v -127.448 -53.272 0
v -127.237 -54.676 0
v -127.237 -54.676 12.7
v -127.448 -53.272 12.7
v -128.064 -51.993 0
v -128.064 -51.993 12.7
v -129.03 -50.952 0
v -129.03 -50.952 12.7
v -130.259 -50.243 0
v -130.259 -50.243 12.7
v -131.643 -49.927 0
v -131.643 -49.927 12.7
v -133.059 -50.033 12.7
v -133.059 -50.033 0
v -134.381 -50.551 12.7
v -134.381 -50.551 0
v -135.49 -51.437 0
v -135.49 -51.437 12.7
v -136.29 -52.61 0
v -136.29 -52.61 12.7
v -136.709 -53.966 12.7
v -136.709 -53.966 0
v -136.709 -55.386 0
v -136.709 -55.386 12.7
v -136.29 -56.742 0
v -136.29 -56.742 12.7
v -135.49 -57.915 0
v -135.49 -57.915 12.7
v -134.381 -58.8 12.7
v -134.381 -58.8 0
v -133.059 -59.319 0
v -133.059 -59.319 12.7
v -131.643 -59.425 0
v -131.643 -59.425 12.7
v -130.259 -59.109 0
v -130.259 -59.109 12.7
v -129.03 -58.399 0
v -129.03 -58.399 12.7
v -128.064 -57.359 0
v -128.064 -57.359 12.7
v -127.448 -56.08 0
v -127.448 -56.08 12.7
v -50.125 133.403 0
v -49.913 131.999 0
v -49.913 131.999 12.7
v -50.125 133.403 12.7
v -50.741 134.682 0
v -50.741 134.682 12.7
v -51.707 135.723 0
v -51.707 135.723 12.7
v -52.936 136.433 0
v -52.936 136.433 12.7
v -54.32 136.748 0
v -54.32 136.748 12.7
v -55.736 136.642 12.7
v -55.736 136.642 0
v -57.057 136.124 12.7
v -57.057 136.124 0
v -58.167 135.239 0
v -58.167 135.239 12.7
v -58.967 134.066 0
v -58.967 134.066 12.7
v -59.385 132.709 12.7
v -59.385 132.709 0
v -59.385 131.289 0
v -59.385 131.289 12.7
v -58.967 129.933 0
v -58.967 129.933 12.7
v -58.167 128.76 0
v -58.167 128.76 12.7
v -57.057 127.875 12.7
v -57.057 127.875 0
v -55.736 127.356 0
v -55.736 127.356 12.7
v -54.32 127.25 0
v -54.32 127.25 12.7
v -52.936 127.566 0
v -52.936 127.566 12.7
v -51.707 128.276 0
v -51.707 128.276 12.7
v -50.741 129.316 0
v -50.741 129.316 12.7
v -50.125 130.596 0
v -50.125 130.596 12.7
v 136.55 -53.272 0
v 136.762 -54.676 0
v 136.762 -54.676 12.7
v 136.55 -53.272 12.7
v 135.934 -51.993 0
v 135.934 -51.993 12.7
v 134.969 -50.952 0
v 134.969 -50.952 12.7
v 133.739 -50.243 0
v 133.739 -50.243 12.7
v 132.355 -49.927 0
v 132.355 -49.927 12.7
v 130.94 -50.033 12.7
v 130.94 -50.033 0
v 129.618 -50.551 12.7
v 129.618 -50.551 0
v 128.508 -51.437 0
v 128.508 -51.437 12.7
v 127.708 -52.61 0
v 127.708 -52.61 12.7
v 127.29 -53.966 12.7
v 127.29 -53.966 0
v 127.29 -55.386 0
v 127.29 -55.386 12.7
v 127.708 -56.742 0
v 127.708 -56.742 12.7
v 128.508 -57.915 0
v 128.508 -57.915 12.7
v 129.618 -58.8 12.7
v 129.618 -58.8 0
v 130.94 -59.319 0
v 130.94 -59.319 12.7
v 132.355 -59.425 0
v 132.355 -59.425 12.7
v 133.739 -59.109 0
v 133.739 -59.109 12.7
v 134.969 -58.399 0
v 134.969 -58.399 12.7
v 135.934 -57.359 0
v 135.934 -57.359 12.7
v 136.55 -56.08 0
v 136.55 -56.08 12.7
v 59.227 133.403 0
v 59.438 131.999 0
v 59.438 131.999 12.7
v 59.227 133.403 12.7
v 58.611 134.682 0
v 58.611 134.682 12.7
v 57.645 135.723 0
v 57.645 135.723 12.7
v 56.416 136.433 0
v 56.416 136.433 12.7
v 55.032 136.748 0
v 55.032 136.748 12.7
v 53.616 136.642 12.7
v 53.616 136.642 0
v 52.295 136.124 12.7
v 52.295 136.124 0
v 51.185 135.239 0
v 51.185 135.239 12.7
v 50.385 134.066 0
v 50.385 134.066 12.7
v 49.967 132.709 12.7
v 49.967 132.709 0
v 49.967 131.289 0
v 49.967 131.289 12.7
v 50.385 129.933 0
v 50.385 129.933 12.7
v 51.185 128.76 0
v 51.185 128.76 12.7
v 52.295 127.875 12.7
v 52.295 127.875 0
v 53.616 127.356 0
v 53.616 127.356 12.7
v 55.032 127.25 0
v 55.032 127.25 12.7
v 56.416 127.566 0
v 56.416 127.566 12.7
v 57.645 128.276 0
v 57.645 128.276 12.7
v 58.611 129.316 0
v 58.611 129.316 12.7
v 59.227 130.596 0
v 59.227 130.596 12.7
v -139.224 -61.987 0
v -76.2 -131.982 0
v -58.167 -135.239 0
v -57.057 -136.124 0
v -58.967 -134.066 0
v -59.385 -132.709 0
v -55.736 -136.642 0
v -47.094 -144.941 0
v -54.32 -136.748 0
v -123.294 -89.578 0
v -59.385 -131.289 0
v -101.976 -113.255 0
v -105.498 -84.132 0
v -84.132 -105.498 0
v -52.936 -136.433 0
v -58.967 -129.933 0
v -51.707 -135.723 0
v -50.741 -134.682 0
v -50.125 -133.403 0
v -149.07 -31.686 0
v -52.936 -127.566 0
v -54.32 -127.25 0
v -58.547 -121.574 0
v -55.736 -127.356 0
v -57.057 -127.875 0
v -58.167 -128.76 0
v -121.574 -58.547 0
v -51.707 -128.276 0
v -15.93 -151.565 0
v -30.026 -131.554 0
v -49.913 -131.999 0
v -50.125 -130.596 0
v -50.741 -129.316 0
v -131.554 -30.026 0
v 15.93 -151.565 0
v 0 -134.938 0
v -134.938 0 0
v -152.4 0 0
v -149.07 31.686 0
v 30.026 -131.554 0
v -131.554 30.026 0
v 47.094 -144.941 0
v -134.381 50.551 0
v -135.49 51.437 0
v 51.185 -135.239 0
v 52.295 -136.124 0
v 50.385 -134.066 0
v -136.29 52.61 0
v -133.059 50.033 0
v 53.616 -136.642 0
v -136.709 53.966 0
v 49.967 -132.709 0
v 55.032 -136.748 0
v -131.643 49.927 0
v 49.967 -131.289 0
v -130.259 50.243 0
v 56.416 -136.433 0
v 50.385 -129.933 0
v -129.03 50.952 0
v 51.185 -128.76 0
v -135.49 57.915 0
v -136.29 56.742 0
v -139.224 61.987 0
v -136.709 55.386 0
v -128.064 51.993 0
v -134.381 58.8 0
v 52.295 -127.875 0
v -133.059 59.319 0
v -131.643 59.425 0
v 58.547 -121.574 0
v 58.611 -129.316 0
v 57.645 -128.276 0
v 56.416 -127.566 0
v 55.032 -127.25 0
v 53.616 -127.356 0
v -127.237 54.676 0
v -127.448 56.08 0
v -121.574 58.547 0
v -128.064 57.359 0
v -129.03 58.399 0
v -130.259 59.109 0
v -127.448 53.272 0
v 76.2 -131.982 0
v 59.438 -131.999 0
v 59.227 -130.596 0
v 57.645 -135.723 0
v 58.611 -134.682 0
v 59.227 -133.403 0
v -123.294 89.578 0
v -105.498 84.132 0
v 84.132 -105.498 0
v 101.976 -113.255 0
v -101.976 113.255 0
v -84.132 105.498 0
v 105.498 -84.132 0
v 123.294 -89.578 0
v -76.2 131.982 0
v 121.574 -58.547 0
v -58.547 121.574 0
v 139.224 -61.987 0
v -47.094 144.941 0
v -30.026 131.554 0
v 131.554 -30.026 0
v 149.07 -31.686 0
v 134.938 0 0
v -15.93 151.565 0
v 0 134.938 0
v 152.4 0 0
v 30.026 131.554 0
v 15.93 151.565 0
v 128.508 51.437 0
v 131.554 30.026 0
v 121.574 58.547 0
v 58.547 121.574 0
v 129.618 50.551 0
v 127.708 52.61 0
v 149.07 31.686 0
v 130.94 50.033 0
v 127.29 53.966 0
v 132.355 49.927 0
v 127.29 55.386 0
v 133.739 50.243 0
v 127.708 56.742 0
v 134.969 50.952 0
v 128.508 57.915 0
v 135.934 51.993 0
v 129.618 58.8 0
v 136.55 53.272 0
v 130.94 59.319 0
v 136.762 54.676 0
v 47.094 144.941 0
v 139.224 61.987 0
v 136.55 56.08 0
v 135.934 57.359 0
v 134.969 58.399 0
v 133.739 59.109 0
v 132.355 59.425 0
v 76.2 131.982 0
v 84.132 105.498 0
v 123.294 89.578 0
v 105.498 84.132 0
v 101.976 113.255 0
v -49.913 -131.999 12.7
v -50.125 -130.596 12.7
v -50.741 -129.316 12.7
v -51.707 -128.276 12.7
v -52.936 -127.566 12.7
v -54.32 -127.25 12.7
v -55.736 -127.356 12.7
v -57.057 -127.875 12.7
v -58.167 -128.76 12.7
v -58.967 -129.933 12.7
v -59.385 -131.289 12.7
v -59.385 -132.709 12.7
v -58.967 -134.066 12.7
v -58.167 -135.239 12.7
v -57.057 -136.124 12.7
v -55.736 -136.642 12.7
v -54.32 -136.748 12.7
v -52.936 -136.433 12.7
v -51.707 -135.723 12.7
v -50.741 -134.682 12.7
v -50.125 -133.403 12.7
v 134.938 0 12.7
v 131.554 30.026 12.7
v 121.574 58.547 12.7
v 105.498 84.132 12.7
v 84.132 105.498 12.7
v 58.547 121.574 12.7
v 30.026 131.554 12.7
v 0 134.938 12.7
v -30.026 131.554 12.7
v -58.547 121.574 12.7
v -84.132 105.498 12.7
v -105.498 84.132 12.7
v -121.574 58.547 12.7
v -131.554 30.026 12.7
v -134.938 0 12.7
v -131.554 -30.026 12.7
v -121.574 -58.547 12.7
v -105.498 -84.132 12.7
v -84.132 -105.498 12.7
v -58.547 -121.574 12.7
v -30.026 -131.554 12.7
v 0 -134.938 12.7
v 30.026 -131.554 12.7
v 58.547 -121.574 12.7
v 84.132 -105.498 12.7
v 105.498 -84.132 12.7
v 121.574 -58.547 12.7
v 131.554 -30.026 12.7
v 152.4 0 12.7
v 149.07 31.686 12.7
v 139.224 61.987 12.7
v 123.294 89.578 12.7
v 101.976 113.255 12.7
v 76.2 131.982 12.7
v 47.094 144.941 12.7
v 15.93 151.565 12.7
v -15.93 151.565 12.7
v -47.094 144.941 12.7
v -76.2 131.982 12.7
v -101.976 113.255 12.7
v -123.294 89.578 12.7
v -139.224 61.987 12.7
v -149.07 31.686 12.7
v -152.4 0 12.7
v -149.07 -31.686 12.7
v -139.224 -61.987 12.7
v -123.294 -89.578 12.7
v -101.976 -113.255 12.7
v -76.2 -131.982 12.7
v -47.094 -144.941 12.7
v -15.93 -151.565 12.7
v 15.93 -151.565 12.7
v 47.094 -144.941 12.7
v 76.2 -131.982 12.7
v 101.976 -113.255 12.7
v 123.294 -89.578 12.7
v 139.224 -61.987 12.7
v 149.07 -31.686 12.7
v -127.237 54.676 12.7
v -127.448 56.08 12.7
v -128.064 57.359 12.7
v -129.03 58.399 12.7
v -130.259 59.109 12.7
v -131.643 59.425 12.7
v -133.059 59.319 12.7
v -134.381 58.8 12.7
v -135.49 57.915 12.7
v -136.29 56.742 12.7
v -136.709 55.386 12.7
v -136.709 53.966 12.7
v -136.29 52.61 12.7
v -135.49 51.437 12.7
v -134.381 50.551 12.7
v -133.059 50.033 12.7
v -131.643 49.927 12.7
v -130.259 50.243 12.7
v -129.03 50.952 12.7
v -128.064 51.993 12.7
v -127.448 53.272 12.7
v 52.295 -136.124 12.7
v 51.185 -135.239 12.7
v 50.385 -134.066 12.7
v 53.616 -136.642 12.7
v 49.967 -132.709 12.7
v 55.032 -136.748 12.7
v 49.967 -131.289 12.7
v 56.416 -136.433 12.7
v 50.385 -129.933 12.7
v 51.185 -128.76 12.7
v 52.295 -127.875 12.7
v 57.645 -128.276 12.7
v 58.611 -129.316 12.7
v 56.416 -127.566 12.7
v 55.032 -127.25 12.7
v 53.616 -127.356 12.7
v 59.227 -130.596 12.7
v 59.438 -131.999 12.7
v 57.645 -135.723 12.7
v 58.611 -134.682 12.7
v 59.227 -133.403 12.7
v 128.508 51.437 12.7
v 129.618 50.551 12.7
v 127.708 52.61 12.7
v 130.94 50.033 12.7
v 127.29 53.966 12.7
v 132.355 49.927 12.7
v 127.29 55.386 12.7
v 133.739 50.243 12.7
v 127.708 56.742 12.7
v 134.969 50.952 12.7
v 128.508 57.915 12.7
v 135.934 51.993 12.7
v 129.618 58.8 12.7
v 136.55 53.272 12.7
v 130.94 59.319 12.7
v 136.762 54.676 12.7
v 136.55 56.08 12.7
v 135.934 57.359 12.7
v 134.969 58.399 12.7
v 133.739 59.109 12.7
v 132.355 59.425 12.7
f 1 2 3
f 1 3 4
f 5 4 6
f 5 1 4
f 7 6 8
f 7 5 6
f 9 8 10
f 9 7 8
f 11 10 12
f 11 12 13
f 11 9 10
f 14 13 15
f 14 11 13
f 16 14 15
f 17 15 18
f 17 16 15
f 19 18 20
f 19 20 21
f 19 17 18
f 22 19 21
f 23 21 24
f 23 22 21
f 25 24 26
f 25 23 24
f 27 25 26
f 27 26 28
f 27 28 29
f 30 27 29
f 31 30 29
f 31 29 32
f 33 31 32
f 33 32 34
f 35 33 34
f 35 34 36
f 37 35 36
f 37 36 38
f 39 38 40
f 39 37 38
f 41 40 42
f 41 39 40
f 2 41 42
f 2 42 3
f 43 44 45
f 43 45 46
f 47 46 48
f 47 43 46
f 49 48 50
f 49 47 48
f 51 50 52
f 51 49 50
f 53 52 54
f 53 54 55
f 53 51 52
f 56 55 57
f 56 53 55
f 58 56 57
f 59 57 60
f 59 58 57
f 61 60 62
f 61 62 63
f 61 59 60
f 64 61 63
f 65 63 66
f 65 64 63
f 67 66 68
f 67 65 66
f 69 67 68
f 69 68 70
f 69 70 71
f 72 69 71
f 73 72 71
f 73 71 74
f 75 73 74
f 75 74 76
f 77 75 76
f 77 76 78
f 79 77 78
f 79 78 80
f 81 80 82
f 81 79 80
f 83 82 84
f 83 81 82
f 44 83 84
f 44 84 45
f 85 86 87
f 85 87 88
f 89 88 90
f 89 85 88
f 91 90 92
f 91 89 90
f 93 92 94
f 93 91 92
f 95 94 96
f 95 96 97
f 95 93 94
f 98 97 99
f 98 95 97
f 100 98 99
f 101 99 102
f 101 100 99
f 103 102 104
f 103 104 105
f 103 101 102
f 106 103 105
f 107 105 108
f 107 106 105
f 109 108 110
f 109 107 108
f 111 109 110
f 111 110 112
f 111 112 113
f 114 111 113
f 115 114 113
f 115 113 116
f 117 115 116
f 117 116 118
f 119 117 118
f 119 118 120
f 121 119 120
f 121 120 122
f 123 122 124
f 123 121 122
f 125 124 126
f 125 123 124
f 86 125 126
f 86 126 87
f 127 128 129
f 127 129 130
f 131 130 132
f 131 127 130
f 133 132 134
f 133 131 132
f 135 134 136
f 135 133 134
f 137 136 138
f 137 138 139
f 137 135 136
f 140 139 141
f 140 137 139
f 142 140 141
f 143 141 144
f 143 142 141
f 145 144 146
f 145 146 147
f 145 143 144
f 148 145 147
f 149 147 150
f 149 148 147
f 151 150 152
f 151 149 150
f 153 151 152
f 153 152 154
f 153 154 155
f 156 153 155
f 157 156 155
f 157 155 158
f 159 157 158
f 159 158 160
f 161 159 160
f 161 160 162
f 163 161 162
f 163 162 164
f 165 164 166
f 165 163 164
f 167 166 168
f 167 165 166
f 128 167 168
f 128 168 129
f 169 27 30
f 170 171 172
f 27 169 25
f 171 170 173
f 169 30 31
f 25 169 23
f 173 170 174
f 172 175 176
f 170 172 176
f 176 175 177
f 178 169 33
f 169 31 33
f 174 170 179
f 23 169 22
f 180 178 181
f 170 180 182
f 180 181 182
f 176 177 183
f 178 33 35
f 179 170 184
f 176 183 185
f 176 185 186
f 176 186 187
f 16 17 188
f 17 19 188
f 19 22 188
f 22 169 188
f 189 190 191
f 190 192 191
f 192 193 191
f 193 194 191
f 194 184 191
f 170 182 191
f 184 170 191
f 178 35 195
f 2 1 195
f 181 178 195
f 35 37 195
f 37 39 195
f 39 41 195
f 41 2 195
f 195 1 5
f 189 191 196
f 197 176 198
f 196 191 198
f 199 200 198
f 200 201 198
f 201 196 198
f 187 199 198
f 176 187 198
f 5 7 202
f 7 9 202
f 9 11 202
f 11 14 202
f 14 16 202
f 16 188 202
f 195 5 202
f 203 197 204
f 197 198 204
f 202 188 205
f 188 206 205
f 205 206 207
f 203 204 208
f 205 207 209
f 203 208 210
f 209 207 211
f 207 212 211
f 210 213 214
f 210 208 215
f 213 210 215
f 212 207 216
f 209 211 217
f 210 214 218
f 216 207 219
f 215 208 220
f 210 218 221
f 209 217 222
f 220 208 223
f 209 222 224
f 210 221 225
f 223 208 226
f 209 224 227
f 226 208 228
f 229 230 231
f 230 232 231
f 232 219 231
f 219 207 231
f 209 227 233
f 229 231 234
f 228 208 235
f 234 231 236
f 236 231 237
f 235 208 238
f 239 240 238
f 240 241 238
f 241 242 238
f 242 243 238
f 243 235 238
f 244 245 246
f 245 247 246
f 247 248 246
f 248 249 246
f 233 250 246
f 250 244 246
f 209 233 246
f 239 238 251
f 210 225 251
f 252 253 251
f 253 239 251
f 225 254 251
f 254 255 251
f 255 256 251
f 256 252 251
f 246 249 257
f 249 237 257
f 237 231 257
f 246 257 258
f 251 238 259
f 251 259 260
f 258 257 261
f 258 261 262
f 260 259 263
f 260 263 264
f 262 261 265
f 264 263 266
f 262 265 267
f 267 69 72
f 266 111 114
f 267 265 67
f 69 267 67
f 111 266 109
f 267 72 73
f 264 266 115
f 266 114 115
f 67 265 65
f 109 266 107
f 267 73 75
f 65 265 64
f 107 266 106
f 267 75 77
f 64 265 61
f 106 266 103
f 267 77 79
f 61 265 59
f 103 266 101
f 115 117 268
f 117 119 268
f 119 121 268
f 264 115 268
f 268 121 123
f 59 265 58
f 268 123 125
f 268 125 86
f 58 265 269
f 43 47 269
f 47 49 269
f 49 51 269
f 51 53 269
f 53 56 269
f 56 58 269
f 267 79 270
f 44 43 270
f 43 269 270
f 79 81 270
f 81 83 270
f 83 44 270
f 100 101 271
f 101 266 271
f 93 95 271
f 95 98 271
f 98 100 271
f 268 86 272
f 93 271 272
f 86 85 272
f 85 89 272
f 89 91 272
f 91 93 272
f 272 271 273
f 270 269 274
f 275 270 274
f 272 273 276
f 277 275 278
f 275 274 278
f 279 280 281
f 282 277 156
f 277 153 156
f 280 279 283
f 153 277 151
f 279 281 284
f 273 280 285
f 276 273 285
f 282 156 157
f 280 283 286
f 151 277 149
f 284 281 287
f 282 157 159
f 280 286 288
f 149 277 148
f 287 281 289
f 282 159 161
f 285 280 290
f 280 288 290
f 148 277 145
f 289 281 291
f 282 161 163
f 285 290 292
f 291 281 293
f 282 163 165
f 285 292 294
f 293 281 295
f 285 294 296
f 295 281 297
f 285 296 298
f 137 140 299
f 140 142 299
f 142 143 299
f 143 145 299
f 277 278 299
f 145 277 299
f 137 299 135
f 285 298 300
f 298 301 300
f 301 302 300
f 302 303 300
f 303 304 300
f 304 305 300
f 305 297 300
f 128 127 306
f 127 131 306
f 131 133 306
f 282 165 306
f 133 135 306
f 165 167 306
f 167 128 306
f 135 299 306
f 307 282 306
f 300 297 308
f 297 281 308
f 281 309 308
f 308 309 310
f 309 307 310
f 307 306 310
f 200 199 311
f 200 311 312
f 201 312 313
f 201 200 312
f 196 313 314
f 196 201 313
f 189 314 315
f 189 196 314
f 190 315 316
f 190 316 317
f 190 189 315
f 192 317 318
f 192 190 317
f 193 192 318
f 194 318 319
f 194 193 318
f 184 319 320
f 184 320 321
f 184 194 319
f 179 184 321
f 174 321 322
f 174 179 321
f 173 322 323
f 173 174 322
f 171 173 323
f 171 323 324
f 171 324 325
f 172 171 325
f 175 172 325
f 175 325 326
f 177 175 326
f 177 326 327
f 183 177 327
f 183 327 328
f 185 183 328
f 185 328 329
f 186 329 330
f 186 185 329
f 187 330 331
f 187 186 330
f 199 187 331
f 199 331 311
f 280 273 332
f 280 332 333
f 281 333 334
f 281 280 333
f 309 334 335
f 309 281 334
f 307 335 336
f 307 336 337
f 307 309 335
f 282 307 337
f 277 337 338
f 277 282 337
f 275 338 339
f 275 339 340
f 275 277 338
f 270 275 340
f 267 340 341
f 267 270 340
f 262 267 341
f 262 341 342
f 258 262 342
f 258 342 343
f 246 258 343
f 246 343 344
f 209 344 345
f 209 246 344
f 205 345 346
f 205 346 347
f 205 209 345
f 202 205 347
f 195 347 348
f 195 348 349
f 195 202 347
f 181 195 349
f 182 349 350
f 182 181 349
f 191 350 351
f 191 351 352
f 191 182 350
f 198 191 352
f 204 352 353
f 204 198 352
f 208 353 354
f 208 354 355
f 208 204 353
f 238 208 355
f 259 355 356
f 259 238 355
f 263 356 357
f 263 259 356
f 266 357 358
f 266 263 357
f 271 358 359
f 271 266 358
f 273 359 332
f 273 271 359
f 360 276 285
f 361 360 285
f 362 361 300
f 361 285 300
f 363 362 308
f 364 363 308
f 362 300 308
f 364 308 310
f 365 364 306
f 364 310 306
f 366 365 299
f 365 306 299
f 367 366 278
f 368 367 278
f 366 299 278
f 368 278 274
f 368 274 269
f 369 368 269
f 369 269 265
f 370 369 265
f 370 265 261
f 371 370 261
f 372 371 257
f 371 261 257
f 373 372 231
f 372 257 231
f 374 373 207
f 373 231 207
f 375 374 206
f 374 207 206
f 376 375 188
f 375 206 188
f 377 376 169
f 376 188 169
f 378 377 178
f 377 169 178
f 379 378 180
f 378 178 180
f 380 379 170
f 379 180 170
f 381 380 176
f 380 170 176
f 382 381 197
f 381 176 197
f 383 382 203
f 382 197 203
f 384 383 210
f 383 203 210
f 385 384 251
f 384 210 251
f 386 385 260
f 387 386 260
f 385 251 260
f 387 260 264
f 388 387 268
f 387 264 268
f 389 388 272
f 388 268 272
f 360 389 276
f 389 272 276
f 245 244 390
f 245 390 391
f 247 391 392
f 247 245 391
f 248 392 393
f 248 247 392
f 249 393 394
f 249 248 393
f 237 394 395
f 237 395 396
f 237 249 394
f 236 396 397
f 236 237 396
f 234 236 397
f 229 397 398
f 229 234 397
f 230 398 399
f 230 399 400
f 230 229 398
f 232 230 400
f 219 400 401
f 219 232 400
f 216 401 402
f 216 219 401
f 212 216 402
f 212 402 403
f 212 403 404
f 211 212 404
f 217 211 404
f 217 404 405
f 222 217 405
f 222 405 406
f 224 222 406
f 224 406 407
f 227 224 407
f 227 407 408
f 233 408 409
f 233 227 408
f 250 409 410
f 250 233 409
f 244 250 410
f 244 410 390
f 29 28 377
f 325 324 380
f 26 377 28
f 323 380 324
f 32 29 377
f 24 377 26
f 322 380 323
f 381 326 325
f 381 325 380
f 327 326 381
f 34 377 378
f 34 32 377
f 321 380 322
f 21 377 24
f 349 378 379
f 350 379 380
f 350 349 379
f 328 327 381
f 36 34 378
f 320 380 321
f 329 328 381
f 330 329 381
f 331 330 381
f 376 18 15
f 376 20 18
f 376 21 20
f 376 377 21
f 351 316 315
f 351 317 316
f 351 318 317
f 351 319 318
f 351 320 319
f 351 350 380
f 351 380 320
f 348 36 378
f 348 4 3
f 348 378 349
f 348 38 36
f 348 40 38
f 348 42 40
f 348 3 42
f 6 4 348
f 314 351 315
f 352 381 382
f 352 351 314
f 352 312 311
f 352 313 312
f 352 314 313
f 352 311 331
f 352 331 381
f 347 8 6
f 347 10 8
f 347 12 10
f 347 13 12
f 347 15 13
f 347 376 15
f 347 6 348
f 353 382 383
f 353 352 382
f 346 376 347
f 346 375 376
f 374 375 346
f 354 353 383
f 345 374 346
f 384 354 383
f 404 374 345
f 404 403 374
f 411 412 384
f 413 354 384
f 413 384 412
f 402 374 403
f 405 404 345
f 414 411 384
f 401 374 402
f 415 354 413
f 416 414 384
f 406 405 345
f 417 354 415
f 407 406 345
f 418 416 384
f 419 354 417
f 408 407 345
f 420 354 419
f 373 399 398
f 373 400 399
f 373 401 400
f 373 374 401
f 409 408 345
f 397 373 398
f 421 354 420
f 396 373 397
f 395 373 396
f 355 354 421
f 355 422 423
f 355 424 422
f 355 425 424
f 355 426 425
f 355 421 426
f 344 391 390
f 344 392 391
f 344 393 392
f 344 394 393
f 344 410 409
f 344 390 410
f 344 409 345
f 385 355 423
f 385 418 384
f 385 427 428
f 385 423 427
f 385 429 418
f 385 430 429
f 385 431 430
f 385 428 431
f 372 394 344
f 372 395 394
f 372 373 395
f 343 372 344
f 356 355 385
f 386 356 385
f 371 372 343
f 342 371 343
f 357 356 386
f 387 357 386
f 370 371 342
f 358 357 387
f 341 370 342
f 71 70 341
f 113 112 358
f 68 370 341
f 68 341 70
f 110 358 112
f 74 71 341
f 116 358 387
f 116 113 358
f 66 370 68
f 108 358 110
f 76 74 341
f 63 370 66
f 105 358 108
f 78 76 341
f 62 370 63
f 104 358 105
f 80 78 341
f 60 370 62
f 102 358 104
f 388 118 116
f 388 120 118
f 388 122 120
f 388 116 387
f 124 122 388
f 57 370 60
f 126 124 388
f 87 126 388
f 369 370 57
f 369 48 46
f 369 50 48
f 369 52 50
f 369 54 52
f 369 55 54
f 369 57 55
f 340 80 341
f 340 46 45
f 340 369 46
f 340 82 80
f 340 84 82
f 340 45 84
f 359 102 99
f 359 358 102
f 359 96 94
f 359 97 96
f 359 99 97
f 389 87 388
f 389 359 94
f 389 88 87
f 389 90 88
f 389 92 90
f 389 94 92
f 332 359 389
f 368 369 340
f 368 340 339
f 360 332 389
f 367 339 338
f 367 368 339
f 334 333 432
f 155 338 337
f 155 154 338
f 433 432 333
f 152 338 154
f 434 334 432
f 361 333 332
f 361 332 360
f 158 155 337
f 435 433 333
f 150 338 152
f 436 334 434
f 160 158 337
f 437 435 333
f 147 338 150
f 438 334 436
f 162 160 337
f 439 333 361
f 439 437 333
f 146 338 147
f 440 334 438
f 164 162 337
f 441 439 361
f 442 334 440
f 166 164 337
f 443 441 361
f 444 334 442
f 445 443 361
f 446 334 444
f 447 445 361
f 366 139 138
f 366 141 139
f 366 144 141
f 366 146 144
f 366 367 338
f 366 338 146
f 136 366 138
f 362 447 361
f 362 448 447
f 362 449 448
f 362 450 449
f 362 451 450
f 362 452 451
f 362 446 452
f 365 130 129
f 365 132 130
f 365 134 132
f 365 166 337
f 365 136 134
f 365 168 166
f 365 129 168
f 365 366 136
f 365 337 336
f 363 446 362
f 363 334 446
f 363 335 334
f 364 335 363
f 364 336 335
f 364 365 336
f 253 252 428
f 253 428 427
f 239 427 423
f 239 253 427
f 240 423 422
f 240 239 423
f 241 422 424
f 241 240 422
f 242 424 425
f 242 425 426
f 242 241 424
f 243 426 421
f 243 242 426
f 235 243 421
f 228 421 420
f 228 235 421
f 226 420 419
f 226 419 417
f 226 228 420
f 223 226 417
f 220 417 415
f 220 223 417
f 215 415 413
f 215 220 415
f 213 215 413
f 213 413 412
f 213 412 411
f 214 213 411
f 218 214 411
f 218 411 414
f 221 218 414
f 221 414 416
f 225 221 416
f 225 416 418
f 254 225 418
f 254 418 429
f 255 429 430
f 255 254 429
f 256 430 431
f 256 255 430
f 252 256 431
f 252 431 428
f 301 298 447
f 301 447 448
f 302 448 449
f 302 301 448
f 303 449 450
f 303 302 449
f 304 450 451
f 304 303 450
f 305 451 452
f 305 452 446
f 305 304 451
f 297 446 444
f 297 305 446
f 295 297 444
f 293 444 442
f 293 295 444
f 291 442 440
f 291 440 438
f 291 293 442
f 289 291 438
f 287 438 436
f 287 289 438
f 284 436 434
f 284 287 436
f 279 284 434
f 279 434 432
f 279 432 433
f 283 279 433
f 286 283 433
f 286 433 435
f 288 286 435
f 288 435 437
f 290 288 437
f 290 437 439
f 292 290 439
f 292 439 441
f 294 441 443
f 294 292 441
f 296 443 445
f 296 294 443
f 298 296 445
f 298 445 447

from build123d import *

# Parameters (mm, degrees)
F0_R     = 152.4
F0_R_2   = 4.7625
F0_R_3   = 134.9375
F1_DEPTH = 12.7


with BuildPart() as f1:
    # F0 (on Top) → F1 (new body)
    with BuildSketch(Plane.XY):
        Circle(F0_R)
        with Locations((-54.675895, -131.999288)):
            Circle(F0_R_2, mode=Mode.SUBTRACT)
        with Locations((-131.999288, -54.675895)):
            Circle(F0_R_2, mode=Mode.SUBTRACT)
        with Locations((54.675895, -131.999288)):
            Circle(F0_R_2, mode=Mode.SUBTRACT)
        with Locations((131.999288, -54.675895)):
            Circle(F0_R_2, mode=Mode.SUBTRACT)
        with Locations((-131.999288, 54.675895)):
            Circle(F0_R_2, mode=Mode.SUBTRACT)
        with Locations((-54.675895, 131.999288)):
            Circle(F0_R_2, mode=Mode.SUBTRACT)
        Circle(F0_R_3, mode=Mode.SUBTRACT)
        with Locations((131.999288, 54.675895)):
            Circle(F0_R_2, mode=Mode.SUBTRACT)
        with Locations((54.675895, 131.999288)):
            Circle(F0_R_2, mode=Mode.SUBTRACT)
    extrude(amount=F1_DEPTH)


solid = f1.part
